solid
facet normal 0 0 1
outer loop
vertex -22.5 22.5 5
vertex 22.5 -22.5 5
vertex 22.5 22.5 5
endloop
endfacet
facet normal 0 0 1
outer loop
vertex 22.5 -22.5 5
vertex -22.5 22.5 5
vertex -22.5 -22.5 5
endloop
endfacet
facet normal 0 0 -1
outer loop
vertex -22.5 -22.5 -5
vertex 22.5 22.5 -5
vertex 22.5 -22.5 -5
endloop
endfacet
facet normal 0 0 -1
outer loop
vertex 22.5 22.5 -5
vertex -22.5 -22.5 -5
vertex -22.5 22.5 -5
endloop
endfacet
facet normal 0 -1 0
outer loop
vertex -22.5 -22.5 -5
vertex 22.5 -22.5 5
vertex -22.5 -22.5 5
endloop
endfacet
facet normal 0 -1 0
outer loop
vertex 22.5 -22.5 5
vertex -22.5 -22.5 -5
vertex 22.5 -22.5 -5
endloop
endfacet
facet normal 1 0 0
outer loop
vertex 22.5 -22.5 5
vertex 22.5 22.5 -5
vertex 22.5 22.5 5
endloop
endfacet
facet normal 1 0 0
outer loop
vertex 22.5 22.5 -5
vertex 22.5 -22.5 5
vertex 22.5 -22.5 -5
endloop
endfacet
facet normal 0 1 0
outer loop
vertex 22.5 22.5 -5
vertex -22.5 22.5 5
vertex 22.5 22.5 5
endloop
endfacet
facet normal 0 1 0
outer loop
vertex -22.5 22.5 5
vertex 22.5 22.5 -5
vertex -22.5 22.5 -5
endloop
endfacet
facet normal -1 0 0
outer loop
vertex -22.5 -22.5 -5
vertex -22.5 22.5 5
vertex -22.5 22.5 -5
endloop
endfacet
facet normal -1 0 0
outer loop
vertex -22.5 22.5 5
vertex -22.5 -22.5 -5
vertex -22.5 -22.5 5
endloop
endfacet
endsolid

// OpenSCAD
// ========================================
// a 45 x 45 x 10 mm box
// NeuroCAD canonical IR; dimensions are millimetres
// ========================================
$fn = 48;

cube(size=[45, 45, 10], center=true);
